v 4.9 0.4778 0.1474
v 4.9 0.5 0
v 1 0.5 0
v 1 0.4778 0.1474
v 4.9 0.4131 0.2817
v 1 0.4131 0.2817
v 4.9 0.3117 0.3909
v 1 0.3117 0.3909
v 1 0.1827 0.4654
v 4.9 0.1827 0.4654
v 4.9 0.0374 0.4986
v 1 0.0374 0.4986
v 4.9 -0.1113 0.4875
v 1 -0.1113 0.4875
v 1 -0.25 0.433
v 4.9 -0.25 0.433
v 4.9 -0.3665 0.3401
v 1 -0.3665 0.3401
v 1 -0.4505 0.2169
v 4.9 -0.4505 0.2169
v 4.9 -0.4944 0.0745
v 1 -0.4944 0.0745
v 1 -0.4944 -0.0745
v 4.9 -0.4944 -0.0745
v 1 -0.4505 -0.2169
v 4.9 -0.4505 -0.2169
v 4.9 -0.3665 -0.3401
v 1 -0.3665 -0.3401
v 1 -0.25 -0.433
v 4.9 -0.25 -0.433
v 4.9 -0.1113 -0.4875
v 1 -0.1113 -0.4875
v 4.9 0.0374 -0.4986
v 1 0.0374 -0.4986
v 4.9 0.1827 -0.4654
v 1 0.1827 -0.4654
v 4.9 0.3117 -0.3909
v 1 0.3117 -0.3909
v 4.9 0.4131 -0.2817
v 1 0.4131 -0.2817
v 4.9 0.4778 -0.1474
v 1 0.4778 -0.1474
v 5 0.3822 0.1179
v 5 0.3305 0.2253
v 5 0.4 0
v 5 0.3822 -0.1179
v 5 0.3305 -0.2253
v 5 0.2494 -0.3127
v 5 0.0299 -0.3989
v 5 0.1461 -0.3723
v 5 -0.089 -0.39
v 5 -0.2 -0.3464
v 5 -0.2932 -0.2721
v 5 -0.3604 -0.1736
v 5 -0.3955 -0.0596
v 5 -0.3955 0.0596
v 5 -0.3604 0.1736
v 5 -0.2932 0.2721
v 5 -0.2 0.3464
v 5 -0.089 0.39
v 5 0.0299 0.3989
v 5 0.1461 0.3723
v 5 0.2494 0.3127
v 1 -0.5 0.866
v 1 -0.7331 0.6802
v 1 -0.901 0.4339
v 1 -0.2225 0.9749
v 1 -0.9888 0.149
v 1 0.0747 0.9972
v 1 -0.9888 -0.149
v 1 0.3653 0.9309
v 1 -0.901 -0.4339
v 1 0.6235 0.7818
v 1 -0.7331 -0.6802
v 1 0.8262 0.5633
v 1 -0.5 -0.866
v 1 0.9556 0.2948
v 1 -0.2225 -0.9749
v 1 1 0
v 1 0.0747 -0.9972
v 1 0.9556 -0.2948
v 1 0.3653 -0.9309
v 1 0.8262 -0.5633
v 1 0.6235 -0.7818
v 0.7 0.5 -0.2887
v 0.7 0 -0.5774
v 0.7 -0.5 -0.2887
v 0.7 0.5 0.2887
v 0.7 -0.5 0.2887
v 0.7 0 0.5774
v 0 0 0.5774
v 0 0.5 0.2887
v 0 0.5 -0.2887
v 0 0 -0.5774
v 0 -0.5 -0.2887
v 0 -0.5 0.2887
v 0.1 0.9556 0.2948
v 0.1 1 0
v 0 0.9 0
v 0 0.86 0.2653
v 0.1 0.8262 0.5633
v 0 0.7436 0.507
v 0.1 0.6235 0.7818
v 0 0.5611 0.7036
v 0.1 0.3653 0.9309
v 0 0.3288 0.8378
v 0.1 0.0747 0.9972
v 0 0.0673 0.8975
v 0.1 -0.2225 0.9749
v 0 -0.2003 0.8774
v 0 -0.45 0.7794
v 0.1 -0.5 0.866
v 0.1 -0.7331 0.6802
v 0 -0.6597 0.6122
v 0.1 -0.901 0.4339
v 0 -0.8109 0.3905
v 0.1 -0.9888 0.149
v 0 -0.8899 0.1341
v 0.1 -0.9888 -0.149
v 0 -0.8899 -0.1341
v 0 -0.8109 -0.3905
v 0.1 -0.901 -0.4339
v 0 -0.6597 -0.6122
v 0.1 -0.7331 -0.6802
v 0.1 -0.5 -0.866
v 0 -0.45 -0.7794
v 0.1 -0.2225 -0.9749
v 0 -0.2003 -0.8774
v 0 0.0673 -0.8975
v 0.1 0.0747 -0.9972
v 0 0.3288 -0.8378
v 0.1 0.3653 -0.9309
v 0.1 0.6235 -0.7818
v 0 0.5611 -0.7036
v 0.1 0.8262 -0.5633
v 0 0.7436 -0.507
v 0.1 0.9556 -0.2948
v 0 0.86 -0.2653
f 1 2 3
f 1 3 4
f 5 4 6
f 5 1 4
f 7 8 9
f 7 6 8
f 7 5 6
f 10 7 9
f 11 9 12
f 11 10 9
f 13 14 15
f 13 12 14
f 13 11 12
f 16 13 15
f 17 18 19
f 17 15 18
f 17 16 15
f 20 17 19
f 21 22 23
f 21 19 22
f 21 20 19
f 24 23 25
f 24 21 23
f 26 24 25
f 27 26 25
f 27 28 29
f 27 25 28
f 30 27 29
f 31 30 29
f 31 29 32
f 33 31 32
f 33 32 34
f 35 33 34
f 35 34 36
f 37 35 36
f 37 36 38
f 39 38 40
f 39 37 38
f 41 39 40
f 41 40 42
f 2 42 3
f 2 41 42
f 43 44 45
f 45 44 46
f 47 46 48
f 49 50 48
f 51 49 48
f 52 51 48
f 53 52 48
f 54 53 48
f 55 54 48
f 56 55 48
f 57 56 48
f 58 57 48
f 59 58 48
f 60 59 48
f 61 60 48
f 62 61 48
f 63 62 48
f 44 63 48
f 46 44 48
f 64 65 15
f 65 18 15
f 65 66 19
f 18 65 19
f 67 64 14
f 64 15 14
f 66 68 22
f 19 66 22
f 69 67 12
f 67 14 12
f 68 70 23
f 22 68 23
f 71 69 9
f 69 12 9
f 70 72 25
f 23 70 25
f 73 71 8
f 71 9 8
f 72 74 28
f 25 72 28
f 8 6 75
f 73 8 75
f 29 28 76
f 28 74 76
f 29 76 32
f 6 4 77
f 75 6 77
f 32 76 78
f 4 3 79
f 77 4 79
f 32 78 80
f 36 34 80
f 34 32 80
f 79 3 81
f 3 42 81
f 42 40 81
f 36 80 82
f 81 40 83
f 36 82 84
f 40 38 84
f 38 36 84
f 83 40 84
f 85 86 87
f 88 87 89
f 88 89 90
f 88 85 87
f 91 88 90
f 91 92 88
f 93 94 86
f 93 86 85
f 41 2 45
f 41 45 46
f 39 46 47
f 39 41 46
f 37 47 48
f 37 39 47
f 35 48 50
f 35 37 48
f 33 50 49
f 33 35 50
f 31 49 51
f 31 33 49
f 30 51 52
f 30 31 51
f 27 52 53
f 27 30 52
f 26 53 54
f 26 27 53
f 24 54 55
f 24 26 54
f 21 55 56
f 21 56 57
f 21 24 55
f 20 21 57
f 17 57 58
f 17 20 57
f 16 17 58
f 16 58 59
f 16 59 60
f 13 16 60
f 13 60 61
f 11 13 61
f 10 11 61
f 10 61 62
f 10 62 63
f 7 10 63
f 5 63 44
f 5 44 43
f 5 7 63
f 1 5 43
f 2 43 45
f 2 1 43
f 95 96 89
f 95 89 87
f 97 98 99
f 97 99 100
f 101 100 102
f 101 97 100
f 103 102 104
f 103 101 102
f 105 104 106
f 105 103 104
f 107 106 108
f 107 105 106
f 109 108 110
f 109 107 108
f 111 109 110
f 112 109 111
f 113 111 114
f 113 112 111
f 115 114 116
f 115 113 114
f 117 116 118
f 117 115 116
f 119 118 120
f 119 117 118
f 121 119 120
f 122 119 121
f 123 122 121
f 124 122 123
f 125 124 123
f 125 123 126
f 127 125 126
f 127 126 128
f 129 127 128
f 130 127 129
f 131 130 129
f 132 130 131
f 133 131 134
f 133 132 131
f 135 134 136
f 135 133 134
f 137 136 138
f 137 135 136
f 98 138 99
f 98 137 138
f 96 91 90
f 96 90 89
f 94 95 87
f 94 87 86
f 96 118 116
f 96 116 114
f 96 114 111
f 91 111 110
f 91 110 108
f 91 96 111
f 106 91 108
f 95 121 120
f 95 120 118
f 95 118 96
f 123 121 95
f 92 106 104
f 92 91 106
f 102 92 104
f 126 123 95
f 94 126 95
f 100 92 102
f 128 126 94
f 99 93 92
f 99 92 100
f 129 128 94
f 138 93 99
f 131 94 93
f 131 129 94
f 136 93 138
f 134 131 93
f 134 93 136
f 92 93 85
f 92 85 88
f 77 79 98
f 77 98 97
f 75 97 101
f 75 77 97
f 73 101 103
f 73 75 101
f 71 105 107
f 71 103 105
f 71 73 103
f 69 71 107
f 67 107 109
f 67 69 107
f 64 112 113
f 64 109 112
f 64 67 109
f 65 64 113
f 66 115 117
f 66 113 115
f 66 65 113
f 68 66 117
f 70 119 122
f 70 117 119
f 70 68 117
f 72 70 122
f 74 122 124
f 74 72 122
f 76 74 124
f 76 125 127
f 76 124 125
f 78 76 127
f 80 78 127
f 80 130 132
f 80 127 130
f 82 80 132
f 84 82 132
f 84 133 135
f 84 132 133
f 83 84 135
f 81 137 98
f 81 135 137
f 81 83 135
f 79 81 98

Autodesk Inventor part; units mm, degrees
ref_plane "YZ Plane" through (0, 0, 0) normal (1, 0, 0) x (0, 1, 0)
ref_plane "XZ Plane" through (0, 0, 0) normal (0, 1, 0) x (-1, 0, 0)
ref_plane "XY Plane" through (0, 0, 0) normal (0, 0, 1) x (1, 0, 0)
sketch "Sketch15" plane through (0, 0, 0) normal (0, 0, 1) x (1, 0, 0)
  line L0 (0, 0) -> (0, 1)
  line L1 (0, 1) -> (1, 1)
  line L2 (3, 4.4) -> (3, 4.4)
  line L3 (1, 0.5) -> (5, 0.5)
  line L4 (5, 0) -> (0, 0)
  line L5 (1, 0.5) -> (1, 1)
  line L6 (5, 0.5) -> (5, 0)
  dimension "d84" = 0.5
  dimension "d87" = 1
  dimension "d116" = 1
  dimension "d117" = 4
revolve "Revolution1" add sketch "Sketch15" angle 360 about axis through (5, 0, 0) along (-1, 0, 0)
chamfer "Chamfer5" distance 0.1 angle 45 1 edges at (5, -0.5, 0)
thread "Thread8" size "M1x0.25" class "6g" standard "ANSI Metric M Profile" length 2
chamfer "Chamfer6" distance 0.1 angle 45 1 edges at (0, -1, 0)
sketch "Sketch19" plane through (0, 0, 0) normal (-1, 0, 0) x (0, 0, 1)
  circle A0 centre (0, 0) radius 0.9 projected
  line L0 (0.2887, 0.5) -> (0.5774, 0)
  line L1 (0.5774, 0) -> (0.2887, -0.5)
  line L2 (0.2887, -0.5) -> (-0.2887, -0.5)
  line L3 (-0.2887, -0.5) -> (-0.5774, 0)
  line L4 (-0.5774, 0) -> (-0.2887, 0.5)
  line L5 (-0.2887, 0.5) -> (0.2887, 0.5)
  dimension "d137" = 1
extrude "Extrusion18" cut sketch "Sketch19" against normal blind 0.7 contours L0 L1 L2 L3 L4 L5
properties part number "Bolt1"
